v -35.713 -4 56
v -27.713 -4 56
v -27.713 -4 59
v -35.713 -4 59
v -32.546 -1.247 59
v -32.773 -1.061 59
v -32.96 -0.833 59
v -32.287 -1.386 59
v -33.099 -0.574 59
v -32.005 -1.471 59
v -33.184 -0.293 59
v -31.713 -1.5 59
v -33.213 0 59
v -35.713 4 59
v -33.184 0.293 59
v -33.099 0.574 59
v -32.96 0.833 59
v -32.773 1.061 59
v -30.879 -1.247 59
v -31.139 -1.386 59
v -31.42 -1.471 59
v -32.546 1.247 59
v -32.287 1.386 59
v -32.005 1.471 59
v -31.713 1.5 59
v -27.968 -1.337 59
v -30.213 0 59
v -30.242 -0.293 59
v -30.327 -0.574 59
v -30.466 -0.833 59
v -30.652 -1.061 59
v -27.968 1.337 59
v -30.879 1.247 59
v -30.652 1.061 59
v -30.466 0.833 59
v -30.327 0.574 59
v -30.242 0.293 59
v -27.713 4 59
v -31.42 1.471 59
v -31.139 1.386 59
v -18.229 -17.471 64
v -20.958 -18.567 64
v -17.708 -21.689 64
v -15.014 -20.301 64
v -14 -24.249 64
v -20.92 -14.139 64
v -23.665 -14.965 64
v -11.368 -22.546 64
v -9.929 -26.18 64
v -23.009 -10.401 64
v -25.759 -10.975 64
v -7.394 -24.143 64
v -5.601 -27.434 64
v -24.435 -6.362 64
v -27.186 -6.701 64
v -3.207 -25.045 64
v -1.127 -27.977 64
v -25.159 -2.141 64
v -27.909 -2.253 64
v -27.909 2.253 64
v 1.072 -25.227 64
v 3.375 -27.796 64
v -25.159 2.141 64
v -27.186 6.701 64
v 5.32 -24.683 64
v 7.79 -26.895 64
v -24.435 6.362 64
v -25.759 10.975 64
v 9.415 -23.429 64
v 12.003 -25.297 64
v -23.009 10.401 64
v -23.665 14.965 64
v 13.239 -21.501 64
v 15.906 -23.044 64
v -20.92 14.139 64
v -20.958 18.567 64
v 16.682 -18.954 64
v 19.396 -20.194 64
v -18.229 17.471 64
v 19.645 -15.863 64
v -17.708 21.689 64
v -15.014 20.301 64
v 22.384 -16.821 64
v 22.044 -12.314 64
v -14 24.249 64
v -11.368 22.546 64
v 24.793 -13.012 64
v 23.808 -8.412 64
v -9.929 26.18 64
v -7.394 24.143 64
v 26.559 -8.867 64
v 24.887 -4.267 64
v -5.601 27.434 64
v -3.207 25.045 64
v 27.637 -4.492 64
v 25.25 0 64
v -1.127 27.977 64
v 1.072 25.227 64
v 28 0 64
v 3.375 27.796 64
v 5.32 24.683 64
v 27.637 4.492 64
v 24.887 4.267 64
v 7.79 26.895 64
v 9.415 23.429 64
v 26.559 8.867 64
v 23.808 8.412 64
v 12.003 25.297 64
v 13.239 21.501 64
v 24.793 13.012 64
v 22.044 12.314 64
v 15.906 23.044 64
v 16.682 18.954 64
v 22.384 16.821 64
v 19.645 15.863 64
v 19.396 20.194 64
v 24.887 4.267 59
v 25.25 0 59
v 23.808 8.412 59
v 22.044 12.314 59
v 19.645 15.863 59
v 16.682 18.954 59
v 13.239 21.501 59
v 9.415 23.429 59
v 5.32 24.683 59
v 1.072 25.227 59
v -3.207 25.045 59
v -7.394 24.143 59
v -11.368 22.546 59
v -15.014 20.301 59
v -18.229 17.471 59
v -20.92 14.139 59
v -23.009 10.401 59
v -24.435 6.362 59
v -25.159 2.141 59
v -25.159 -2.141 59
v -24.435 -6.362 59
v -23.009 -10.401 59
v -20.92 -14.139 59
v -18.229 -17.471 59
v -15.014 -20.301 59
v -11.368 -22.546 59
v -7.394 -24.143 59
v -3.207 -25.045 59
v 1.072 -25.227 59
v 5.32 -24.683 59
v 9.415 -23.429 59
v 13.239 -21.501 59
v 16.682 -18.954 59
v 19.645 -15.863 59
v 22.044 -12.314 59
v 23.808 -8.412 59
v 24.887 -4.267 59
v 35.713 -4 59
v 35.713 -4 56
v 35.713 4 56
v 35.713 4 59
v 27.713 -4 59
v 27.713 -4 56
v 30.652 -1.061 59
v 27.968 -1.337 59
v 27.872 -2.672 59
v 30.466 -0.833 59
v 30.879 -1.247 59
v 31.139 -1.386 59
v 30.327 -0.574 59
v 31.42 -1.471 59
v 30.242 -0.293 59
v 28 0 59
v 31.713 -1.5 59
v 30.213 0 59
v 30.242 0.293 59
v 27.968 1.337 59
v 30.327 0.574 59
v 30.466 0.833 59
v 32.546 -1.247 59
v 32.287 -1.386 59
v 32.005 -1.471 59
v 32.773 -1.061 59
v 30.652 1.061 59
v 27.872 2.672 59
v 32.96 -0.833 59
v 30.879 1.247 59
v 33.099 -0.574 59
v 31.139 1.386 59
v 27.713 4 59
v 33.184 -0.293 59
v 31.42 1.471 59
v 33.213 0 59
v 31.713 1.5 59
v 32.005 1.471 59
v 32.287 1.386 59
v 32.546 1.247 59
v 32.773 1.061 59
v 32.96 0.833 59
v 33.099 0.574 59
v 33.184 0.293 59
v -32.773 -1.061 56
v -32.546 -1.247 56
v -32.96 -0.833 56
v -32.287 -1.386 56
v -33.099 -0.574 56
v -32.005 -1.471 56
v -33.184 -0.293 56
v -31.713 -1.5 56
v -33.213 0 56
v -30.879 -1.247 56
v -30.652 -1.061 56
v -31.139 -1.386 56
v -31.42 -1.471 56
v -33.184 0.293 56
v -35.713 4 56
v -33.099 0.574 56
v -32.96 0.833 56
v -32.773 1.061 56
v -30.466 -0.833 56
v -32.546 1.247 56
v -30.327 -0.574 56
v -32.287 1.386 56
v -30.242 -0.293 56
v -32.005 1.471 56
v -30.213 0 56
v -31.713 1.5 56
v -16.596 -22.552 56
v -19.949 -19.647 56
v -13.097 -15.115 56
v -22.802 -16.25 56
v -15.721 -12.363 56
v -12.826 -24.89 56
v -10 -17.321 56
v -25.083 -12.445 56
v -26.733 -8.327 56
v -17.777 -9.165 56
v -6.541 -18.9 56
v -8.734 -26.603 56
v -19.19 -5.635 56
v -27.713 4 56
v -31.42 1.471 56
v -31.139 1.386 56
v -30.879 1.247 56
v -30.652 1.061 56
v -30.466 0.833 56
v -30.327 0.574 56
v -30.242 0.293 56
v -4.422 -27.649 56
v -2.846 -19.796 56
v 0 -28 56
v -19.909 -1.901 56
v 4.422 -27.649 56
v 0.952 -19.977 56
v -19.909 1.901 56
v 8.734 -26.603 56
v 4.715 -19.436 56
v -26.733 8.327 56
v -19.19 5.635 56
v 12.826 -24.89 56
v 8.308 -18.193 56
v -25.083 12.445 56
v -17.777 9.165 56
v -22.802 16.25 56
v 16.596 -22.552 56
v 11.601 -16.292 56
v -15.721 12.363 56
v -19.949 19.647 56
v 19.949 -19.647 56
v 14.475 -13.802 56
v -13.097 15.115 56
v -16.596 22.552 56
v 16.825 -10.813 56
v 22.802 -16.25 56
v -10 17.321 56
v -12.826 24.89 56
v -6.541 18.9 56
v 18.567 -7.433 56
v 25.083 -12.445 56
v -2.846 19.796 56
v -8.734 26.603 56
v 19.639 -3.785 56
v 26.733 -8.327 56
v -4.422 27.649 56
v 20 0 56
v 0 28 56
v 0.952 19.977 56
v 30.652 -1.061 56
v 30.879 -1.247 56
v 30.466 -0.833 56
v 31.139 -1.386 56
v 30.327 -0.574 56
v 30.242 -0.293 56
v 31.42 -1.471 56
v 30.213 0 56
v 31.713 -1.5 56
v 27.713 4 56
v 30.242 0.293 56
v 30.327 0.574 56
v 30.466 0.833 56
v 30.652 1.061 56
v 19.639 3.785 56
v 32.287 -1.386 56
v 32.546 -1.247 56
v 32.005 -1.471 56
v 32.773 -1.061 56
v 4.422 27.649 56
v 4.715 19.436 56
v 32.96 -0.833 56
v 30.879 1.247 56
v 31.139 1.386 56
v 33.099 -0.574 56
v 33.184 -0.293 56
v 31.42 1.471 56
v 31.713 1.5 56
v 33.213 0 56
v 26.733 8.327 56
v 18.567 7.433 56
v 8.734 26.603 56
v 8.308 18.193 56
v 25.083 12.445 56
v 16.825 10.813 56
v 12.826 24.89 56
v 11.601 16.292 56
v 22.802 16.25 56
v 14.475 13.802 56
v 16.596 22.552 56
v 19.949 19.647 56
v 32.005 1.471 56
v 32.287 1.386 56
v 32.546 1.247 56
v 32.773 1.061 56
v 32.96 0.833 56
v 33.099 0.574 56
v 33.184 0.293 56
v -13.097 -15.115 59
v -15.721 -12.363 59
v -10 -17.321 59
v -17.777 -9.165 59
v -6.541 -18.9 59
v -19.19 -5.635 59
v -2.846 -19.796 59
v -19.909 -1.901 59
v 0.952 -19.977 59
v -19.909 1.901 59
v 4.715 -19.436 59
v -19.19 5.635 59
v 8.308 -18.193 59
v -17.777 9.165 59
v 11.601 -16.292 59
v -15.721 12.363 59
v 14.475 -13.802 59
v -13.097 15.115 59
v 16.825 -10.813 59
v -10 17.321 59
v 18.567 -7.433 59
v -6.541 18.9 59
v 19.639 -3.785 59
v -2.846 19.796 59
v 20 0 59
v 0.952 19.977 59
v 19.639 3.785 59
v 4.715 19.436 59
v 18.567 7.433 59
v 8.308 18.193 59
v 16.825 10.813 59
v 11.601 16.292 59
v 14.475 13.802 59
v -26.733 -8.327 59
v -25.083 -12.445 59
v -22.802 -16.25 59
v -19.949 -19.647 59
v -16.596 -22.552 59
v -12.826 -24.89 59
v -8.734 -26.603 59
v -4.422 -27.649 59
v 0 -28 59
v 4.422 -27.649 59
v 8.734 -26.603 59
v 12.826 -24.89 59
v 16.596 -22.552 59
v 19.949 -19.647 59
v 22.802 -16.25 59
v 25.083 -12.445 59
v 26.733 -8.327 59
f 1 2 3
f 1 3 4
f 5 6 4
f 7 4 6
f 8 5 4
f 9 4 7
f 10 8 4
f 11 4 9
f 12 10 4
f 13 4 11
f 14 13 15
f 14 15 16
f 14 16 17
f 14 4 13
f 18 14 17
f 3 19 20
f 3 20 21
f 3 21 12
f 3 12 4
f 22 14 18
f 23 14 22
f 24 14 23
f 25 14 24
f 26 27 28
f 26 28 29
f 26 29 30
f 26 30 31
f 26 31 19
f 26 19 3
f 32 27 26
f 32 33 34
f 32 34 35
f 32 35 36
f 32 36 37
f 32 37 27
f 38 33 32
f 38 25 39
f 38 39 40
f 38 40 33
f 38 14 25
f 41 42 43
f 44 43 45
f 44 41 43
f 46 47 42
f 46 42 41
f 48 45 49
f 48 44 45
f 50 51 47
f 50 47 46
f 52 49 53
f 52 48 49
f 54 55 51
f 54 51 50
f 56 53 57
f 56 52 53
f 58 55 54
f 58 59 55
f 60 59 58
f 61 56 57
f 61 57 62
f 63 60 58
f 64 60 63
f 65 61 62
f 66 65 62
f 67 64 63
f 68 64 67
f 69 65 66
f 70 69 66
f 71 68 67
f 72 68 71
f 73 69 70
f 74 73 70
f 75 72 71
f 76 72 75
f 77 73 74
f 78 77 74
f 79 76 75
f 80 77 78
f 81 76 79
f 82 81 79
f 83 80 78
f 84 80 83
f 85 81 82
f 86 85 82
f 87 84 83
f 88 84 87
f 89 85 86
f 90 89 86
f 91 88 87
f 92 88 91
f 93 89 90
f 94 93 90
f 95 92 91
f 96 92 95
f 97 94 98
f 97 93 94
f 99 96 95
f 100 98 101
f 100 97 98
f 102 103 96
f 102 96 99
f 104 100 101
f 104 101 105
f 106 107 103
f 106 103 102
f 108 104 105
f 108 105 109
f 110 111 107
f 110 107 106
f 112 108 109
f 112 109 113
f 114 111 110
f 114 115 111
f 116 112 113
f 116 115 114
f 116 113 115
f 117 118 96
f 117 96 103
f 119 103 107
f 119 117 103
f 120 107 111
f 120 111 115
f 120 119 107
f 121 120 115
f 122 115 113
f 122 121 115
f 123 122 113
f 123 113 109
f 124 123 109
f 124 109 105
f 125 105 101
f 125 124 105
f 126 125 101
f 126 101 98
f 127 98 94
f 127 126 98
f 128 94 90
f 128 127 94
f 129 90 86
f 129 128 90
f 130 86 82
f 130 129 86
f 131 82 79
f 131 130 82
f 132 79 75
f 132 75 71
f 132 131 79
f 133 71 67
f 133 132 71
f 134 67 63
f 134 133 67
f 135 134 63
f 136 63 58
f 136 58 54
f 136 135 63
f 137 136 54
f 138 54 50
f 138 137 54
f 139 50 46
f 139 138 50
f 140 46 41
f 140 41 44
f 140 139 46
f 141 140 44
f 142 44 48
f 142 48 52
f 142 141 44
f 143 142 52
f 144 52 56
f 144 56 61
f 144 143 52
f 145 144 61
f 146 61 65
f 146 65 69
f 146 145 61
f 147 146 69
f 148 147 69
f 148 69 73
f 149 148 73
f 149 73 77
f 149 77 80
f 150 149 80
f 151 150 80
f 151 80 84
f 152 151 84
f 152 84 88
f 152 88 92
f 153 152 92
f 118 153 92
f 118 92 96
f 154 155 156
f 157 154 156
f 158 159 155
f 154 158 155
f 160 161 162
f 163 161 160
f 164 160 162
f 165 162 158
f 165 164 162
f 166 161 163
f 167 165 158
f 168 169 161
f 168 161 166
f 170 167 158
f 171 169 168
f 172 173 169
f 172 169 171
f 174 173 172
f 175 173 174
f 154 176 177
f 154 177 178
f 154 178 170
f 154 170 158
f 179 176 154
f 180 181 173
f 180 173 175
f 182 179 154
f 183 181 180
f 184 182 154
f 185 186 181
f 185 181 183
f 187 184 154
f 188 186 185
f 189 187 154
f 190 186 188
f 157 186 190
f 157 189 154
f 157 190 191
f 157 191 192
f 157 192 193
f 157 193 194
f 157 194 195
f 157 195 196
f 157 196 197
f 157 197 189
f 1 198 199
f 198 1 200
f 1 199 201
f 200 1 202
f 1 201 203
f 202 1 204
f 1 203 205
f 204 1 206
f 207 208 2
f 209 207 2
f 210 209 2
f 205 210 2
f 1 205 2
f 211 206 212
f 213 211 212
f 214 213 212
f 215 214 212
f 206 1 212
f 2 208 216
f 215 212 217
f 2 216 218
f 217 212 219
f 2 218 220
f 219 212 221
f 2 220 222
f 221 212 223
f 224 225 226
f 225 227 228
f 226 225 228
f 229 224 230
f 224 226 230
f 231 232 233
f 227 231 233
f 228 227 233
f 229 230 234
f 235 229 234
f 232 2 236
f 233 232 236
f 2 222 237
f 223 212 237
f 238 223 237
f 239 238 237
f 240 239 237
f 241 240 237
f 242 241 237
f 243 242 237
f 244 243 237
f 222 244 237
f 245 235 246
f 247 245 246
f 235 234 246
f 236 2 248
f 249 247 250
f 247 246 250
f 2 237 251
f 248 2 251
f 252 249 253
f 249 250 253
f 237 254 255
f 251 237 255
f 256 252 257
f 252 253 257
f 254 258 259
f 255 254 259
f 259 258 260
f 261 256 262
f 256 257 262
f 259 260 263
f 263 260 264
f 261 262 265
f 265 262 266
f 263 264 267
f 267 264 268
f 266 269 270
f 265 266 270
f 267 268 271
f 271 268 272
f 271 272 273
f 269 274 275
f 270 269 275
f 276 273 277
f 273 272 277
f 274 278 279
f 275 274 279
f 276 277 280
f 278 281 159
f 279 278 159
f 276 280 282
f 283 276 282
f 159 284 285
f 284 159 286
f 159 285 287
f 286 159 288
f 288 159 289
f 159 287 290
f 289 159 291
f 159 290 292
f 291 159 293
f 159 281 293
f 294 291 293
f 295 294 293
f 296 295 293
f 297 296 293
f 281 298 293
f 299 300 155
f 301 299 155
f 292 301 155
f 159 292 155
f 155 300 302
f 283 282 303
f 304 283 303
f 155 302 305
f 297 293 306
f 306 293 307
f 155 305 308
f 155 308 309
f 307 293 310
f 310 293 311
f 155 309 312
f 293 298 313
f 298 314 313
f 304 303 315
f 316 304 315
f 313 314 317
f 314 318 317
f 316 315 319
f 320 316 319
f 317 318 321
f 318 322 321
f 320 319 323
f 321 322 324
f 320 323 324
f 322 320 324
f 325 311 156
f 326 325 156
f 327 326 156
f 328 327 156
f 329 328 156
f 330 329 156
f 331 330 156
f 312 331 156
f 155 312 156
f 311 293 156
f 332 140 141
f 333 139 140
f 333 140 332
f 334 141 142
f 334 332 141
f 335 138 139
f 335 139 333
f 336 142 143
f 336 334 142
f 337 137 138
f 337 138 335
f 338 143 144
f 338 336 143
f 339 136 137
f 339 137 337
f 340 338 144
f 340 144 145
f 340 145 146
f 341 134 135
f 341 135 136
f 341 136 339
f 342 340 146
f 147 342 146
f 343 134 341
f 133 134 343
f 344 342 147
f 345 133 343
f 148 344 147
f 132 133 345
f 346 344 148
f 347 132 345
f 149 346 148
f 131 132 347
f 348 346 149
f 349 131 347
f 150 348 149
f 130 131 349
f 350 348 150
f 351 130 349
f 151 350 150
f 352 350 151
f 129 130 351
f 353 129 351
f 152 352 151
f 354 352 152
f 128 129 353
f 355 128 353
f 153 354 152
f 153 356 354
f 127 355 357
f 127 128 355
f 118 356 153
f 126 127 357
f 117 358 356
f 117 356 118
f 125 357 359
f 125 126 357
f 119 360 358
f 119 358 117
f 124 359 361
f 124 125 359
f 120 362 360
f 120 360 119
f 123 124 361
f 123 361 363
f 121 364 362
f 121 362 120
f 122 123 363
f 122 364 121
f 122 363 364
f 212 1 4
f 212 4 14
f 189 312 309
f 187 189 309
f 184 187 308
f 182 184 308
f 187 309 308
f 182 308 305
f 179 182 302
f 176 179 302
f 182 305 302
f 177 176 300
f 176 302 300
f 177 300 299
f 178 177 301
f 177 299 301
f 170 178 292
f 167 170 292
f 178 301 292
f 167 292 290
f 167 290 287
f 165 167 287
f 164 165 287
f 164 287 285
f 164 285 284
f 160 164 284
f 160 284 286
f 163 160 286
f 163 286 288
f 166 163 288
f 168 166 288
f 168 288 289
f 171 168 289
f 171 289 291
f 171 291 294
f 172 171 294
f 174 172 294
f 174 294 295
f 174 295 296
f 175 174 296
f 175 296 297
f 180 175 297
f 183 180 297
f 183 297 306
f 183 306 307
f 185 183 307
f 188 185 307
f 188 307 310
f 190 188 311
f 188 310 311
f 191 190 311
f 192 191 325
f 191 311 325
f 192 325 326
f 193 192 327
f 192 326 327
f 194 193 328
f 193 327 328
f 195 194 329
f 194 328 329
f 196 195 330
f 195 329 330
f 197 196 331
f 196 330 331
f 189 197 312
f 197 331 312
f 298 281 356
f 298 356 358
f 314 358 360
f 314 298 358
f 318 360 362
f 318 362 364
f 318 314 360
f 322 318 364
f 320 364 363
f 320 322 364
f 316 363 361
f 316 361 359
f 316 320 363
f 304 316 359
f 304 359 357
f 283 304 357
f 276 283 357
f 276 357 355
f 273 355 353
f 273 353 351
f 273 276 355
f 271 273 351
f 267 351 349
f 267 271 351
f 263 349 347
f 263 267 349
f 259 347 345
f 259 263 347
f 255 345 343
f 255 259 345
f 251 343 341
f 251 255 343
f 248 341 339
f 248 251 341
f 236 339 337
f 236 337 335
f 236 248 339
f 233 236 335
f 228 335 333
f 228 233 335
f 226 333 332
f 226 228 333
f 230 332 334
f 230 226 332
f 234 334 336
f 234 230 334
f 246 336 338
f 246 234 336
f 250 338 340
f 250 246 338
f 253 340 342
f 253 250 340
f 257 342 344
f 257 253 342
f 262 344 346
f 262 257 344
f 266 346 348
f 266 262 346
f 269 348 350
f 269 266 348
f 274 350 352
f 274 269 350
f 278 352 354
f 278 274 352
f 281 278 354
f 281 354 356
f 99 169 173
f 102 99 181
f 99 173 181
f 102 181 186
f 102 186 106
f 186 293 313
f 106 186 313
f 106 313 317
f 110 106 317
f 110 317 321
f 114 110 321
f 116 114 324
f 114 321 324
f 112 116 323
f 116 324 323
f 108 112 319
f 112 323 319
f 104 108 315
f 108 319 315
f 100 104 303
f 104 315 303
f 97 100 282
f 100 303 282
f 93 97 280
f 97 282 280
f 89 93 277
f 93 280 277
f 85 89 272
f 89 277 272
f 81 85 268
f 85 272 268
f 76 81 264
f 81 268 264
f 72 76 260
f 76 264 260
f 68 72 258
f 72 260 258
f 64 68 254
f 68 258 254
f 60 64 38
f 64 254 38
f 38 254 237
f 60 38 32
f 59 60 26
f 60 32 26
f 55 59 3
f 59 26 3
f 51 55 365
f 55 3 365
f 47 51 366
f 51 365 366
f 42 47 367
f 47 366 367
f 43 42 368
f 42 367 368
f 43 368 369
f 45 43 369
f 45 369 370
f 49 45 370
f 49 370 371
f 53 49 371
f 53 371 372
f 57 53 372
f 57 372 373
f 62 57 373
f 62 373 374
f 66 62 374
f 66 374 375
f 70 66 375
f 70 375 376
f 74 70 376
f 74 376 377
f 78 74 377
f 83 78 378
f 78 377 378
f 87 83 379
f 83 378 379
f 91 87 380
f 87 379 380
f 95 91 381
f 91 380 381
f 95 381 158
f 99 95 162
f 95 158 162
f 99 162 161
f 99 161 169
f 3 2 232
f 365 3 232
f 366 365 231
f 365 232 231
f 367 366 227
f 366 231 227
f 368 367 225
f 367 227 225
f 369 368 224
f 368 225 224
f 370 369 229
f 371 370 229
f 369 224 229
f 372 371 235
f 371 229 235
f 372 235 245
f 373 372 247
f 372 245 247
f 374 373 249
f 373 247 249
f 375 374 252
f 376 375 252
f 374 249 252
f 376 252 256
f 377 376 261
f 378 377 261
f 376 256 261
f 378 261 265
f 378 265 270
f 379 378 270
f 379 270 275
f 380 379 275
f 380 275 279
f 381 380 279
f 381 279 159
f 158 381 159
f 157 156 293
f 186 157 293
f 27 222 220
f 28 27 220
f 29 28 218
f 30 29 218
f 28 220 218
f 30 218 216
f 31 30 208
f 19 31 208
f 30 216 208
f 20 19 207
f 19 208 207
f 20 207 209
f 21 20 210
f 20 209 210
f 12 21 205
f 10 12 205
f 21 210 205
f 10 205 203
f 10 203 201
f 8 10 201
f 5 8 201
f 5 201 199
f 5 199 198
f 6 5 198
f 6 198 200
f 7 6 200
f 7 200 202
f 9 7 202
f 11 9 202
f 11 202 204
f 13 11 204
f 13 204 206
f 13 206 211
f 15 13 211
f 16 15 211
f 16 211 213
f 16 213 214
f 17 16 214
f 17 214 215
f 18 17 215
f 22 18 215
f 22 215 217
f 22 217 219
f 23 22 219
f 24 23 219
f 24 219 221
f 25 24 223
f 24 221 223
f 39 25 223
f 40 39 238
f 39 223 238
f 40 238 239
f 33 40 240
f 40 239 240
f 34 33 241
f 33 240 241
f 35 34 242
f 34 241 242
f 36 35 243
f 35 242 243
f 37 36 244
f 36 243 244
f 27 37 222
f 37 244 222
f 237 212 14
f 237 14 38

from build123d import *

# Parameters (mm, degrees)
SKETCH023_R     = 20
PAD007_DEPTH    = 3
SKETCH251_R     = 28
SKETCH251_R_2   = 25.25
PAD095_DEPTH    = 5
SKETCH256_R     = 1.5
POCKET125_DEPTH = 8.001


with BuildPart() as part:
    # Sketch023 → Pad007 (new body)
    with BuildSketch(Plane.XY):
        with BuildLine():
            Line((27.712813, -4), (35.712813, -4))
            Line((35.712813, -4), (35.712813, 4))
            Line((35.712813, 4), (27.712813, 4))
            ThreePointArc((27.712813, 4), (0, 28), (-27.712813, 4))
            Line((-35.712813, 4), (-27.712813, 4))
            Line((-35.712813, -4), (-35.712813, 4))
            Line((-27.712813, -4), (-35.712813, -4))
            ThreePointArc((-27.712813, -4), (0, -28), (27.712813, -4))
        make_face()
        Circle(SKETCH023_R, mode=Mode.SUBTRACT)
    extrude(amount=PAD007_DEPTH)

    # Sketch251 → Pad095 (join)
    with BuildSketch(Plane.XY.offset(3)):
        Circle(SKETCH251_R)
        Circle(SKETCH251_R_2, mode=Mode.SUBTRACT)
    extrude(amount=PAD095_DEPTH)

    # Sketch256 (on Face4 of Pad095) → Pocket125 (cut, through all)
    with BuildSketch(Plane(origin=(0, 0, 0), x_dir=(1, 0, 0), z_dir=(0, 0, -1))):
        with Locations((31.712813, 0)):
            Circle(SKETCH256_R)
        with Locations((-31.712813, 0)):
            Circle(SKETCH256_R)
    extrude(amount=-POCKET125_DEPTH, mode=Mode.SUBTRACT)


with BuildPart() as part_1:
    # Body007 placement: moved
    add(part.part.moved(Location((0, 0, 56))))


solid = part_1.part
